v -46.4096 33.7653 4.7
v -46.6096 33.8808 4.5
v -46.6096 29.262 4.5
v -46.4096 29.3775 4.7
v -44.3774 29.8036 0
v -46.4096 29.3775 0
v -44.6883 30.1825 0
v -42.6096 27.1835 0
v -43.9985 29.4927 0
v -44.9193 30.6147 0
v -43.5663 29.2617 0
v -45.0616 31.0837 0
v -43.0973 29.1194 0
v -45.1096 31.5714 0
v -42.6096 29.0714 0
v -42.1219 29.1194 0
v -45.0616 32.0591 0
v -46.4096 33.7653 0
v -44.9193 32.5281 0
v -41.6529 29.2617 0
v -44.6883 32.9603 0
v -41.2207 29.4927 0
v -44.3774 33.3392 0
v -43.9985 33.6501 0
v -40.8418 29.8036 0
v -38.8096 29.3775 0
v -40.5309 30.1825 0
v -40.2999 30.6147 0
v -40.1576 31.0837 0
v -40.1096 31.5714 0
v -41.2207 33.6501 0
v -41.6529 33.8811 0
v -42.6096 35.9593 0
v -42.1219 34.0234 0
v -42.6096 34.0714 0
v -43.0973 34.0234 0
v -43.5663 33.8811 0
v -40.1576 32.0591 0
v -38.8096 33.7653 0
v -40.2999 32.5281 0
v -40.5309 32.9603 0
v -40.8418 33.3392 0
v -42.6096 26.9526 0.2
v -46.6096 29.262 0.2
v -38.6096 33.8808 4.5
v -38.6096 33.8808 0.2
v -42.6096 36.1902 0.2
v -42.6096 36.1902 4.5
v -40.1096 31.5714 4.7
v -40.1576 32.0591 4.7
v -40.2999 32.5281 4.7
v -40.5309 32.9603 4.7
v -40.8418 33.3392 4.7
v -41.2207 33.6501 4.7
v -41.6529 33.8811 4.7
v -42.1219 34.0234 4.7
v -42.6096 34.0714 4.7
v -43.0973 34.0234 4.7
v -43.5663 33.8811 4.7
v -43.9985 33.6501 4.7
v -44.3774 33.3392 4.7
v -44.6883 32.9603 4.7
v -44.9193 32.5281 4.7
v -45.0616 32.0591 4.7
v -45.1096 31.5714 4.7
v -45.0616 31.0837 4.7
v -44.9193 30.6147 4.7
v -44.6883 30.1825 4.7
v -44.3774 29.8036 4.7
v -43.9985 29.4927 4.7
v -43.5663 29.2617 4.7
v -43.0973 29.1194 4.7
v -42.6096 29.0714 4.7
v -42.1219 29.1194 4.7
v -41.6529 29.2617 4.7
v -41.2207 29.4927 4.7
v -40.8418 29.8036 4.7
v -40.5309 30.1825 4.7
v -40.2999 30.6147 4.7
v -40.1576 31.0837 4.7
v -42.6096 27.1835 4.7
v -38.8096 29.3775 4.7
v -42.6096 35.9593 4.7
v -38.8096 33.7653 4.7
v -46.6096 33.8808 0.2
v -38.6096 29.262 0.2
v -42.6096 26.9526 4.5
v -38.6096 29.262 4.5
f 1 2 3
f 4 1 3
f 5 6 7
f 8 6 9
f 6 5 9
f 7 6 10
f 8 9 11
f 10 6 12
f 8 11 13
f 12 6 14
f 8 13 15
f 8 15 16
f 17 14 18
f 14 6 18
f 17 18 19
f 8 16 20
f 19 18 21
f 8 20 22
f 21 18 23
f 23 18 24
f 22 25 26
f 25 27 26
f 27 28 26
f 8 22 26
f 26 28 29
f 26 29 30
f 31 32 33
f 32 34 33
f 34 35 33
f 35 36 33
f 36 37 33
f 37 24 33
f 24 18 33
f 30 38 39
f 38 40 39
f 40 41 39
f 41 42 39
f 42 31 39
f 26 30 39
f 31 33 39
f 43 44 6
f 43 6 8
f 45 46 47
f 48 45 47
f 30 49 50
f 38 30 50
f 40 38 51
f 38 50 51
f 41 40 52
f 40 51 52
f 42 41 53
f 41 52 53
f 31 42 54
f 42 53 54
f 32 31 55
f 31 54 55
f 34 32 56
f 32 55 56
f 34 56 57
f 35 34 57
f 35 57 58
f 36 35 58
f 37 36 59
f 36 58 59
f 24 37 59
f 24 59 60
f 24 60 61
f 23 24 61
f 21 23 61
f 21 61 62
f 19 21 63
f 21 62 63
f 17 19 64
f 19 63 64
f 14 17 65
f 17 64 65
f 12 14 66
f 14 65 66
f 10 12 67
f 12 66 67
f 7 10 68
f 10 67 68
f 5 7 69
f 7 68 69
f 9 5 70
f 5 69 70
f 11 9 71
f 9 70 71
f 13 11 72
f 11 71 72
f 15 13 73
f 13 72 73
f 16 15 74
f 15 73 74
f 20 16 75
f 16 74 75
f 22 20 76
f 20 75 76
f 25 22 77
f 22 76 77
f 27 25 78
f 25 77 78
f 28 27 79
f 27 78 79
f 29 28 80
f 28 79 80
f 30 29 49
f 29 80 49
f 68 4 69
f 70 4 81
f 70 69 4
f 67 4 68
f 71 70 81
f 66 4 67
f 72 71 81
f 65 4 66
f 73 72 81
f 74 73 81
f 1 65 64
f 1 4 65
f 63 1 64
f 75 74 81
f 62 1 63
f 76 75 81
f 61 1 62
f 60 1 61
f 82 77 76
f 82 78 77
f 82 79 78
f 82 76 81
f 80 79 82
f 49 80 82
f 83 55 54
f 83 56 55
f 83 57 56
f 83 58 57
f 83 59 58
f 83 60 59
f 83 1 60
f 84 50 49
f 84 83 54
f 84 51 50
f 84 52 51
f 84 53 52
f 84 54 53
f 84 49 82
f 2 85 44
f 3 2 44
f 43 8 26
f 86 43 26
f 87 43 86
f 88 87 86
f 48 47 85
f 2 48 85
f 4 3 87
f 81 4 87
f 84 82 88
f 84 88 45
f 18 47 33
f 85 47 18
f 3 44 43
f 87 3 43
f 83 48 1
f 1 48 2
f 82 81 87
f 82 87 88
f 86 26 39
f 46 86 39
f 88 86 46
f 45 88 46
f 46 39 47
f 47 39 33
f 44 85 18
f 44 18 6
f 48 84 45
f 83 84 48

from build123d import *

# Parameters (mm, degrees)
PAD_DEPTH    = 4.7
SKETCH001_R  = 2.5
POCKET_DEPTH = 4.7
CHAMFER_SIZE = 0.2


with BuildPart() as part:
    # Sketch → Pad (new body)
    with BuildSketch(Plane.XY):
        Polygon((-38.60959, 29.262009), (-38.60959, 33.880811), (-42.60959, 36.190212), (-46.60959, 33.880811), (-46.60959, 29.262009), (-42.60959, 26.952608), align=None)
    extrude(amount=PAD_DEPTH)

    # Sketch001 → Pocket (cut)
    with BuildSketch(Plane.XY.offset(4.7)):
        with Locations((-42.60959, 31.57141)):
            Circle(SKETCH001_R)
    extrude(amount=-POCKET_DEPTH, mode=Mode.SUBTRACT)

    # Chamfer
    chamfer_edges = [part.edges().sort_by_distance(p)[0] for p in [
        (-40.60959, 28.107309, 4.7),
        (-38.60959, 31.57141, 4.7),
        (-40.60959, 35.035512, 4.7),
        (-44.60959, 35.035512, 4.7),
        (-46.60959, 31.57141, 4.7),
        (-44.60959, 28.107309, 4.7),
        (-44.60959, 28.107309, 0),
        (-46.60959, 31.57141, 0),
        (-44.60959, 35.035512, 0),
        (-40.60959, 35.035512, 0),
        (-38.60959, 31.57141, 0),
        (-40.60959, 28.107309, 0),
    ]]
    chamfer(chamfer_edges, length=CHAMFER_SIZE)


solid = part.part
